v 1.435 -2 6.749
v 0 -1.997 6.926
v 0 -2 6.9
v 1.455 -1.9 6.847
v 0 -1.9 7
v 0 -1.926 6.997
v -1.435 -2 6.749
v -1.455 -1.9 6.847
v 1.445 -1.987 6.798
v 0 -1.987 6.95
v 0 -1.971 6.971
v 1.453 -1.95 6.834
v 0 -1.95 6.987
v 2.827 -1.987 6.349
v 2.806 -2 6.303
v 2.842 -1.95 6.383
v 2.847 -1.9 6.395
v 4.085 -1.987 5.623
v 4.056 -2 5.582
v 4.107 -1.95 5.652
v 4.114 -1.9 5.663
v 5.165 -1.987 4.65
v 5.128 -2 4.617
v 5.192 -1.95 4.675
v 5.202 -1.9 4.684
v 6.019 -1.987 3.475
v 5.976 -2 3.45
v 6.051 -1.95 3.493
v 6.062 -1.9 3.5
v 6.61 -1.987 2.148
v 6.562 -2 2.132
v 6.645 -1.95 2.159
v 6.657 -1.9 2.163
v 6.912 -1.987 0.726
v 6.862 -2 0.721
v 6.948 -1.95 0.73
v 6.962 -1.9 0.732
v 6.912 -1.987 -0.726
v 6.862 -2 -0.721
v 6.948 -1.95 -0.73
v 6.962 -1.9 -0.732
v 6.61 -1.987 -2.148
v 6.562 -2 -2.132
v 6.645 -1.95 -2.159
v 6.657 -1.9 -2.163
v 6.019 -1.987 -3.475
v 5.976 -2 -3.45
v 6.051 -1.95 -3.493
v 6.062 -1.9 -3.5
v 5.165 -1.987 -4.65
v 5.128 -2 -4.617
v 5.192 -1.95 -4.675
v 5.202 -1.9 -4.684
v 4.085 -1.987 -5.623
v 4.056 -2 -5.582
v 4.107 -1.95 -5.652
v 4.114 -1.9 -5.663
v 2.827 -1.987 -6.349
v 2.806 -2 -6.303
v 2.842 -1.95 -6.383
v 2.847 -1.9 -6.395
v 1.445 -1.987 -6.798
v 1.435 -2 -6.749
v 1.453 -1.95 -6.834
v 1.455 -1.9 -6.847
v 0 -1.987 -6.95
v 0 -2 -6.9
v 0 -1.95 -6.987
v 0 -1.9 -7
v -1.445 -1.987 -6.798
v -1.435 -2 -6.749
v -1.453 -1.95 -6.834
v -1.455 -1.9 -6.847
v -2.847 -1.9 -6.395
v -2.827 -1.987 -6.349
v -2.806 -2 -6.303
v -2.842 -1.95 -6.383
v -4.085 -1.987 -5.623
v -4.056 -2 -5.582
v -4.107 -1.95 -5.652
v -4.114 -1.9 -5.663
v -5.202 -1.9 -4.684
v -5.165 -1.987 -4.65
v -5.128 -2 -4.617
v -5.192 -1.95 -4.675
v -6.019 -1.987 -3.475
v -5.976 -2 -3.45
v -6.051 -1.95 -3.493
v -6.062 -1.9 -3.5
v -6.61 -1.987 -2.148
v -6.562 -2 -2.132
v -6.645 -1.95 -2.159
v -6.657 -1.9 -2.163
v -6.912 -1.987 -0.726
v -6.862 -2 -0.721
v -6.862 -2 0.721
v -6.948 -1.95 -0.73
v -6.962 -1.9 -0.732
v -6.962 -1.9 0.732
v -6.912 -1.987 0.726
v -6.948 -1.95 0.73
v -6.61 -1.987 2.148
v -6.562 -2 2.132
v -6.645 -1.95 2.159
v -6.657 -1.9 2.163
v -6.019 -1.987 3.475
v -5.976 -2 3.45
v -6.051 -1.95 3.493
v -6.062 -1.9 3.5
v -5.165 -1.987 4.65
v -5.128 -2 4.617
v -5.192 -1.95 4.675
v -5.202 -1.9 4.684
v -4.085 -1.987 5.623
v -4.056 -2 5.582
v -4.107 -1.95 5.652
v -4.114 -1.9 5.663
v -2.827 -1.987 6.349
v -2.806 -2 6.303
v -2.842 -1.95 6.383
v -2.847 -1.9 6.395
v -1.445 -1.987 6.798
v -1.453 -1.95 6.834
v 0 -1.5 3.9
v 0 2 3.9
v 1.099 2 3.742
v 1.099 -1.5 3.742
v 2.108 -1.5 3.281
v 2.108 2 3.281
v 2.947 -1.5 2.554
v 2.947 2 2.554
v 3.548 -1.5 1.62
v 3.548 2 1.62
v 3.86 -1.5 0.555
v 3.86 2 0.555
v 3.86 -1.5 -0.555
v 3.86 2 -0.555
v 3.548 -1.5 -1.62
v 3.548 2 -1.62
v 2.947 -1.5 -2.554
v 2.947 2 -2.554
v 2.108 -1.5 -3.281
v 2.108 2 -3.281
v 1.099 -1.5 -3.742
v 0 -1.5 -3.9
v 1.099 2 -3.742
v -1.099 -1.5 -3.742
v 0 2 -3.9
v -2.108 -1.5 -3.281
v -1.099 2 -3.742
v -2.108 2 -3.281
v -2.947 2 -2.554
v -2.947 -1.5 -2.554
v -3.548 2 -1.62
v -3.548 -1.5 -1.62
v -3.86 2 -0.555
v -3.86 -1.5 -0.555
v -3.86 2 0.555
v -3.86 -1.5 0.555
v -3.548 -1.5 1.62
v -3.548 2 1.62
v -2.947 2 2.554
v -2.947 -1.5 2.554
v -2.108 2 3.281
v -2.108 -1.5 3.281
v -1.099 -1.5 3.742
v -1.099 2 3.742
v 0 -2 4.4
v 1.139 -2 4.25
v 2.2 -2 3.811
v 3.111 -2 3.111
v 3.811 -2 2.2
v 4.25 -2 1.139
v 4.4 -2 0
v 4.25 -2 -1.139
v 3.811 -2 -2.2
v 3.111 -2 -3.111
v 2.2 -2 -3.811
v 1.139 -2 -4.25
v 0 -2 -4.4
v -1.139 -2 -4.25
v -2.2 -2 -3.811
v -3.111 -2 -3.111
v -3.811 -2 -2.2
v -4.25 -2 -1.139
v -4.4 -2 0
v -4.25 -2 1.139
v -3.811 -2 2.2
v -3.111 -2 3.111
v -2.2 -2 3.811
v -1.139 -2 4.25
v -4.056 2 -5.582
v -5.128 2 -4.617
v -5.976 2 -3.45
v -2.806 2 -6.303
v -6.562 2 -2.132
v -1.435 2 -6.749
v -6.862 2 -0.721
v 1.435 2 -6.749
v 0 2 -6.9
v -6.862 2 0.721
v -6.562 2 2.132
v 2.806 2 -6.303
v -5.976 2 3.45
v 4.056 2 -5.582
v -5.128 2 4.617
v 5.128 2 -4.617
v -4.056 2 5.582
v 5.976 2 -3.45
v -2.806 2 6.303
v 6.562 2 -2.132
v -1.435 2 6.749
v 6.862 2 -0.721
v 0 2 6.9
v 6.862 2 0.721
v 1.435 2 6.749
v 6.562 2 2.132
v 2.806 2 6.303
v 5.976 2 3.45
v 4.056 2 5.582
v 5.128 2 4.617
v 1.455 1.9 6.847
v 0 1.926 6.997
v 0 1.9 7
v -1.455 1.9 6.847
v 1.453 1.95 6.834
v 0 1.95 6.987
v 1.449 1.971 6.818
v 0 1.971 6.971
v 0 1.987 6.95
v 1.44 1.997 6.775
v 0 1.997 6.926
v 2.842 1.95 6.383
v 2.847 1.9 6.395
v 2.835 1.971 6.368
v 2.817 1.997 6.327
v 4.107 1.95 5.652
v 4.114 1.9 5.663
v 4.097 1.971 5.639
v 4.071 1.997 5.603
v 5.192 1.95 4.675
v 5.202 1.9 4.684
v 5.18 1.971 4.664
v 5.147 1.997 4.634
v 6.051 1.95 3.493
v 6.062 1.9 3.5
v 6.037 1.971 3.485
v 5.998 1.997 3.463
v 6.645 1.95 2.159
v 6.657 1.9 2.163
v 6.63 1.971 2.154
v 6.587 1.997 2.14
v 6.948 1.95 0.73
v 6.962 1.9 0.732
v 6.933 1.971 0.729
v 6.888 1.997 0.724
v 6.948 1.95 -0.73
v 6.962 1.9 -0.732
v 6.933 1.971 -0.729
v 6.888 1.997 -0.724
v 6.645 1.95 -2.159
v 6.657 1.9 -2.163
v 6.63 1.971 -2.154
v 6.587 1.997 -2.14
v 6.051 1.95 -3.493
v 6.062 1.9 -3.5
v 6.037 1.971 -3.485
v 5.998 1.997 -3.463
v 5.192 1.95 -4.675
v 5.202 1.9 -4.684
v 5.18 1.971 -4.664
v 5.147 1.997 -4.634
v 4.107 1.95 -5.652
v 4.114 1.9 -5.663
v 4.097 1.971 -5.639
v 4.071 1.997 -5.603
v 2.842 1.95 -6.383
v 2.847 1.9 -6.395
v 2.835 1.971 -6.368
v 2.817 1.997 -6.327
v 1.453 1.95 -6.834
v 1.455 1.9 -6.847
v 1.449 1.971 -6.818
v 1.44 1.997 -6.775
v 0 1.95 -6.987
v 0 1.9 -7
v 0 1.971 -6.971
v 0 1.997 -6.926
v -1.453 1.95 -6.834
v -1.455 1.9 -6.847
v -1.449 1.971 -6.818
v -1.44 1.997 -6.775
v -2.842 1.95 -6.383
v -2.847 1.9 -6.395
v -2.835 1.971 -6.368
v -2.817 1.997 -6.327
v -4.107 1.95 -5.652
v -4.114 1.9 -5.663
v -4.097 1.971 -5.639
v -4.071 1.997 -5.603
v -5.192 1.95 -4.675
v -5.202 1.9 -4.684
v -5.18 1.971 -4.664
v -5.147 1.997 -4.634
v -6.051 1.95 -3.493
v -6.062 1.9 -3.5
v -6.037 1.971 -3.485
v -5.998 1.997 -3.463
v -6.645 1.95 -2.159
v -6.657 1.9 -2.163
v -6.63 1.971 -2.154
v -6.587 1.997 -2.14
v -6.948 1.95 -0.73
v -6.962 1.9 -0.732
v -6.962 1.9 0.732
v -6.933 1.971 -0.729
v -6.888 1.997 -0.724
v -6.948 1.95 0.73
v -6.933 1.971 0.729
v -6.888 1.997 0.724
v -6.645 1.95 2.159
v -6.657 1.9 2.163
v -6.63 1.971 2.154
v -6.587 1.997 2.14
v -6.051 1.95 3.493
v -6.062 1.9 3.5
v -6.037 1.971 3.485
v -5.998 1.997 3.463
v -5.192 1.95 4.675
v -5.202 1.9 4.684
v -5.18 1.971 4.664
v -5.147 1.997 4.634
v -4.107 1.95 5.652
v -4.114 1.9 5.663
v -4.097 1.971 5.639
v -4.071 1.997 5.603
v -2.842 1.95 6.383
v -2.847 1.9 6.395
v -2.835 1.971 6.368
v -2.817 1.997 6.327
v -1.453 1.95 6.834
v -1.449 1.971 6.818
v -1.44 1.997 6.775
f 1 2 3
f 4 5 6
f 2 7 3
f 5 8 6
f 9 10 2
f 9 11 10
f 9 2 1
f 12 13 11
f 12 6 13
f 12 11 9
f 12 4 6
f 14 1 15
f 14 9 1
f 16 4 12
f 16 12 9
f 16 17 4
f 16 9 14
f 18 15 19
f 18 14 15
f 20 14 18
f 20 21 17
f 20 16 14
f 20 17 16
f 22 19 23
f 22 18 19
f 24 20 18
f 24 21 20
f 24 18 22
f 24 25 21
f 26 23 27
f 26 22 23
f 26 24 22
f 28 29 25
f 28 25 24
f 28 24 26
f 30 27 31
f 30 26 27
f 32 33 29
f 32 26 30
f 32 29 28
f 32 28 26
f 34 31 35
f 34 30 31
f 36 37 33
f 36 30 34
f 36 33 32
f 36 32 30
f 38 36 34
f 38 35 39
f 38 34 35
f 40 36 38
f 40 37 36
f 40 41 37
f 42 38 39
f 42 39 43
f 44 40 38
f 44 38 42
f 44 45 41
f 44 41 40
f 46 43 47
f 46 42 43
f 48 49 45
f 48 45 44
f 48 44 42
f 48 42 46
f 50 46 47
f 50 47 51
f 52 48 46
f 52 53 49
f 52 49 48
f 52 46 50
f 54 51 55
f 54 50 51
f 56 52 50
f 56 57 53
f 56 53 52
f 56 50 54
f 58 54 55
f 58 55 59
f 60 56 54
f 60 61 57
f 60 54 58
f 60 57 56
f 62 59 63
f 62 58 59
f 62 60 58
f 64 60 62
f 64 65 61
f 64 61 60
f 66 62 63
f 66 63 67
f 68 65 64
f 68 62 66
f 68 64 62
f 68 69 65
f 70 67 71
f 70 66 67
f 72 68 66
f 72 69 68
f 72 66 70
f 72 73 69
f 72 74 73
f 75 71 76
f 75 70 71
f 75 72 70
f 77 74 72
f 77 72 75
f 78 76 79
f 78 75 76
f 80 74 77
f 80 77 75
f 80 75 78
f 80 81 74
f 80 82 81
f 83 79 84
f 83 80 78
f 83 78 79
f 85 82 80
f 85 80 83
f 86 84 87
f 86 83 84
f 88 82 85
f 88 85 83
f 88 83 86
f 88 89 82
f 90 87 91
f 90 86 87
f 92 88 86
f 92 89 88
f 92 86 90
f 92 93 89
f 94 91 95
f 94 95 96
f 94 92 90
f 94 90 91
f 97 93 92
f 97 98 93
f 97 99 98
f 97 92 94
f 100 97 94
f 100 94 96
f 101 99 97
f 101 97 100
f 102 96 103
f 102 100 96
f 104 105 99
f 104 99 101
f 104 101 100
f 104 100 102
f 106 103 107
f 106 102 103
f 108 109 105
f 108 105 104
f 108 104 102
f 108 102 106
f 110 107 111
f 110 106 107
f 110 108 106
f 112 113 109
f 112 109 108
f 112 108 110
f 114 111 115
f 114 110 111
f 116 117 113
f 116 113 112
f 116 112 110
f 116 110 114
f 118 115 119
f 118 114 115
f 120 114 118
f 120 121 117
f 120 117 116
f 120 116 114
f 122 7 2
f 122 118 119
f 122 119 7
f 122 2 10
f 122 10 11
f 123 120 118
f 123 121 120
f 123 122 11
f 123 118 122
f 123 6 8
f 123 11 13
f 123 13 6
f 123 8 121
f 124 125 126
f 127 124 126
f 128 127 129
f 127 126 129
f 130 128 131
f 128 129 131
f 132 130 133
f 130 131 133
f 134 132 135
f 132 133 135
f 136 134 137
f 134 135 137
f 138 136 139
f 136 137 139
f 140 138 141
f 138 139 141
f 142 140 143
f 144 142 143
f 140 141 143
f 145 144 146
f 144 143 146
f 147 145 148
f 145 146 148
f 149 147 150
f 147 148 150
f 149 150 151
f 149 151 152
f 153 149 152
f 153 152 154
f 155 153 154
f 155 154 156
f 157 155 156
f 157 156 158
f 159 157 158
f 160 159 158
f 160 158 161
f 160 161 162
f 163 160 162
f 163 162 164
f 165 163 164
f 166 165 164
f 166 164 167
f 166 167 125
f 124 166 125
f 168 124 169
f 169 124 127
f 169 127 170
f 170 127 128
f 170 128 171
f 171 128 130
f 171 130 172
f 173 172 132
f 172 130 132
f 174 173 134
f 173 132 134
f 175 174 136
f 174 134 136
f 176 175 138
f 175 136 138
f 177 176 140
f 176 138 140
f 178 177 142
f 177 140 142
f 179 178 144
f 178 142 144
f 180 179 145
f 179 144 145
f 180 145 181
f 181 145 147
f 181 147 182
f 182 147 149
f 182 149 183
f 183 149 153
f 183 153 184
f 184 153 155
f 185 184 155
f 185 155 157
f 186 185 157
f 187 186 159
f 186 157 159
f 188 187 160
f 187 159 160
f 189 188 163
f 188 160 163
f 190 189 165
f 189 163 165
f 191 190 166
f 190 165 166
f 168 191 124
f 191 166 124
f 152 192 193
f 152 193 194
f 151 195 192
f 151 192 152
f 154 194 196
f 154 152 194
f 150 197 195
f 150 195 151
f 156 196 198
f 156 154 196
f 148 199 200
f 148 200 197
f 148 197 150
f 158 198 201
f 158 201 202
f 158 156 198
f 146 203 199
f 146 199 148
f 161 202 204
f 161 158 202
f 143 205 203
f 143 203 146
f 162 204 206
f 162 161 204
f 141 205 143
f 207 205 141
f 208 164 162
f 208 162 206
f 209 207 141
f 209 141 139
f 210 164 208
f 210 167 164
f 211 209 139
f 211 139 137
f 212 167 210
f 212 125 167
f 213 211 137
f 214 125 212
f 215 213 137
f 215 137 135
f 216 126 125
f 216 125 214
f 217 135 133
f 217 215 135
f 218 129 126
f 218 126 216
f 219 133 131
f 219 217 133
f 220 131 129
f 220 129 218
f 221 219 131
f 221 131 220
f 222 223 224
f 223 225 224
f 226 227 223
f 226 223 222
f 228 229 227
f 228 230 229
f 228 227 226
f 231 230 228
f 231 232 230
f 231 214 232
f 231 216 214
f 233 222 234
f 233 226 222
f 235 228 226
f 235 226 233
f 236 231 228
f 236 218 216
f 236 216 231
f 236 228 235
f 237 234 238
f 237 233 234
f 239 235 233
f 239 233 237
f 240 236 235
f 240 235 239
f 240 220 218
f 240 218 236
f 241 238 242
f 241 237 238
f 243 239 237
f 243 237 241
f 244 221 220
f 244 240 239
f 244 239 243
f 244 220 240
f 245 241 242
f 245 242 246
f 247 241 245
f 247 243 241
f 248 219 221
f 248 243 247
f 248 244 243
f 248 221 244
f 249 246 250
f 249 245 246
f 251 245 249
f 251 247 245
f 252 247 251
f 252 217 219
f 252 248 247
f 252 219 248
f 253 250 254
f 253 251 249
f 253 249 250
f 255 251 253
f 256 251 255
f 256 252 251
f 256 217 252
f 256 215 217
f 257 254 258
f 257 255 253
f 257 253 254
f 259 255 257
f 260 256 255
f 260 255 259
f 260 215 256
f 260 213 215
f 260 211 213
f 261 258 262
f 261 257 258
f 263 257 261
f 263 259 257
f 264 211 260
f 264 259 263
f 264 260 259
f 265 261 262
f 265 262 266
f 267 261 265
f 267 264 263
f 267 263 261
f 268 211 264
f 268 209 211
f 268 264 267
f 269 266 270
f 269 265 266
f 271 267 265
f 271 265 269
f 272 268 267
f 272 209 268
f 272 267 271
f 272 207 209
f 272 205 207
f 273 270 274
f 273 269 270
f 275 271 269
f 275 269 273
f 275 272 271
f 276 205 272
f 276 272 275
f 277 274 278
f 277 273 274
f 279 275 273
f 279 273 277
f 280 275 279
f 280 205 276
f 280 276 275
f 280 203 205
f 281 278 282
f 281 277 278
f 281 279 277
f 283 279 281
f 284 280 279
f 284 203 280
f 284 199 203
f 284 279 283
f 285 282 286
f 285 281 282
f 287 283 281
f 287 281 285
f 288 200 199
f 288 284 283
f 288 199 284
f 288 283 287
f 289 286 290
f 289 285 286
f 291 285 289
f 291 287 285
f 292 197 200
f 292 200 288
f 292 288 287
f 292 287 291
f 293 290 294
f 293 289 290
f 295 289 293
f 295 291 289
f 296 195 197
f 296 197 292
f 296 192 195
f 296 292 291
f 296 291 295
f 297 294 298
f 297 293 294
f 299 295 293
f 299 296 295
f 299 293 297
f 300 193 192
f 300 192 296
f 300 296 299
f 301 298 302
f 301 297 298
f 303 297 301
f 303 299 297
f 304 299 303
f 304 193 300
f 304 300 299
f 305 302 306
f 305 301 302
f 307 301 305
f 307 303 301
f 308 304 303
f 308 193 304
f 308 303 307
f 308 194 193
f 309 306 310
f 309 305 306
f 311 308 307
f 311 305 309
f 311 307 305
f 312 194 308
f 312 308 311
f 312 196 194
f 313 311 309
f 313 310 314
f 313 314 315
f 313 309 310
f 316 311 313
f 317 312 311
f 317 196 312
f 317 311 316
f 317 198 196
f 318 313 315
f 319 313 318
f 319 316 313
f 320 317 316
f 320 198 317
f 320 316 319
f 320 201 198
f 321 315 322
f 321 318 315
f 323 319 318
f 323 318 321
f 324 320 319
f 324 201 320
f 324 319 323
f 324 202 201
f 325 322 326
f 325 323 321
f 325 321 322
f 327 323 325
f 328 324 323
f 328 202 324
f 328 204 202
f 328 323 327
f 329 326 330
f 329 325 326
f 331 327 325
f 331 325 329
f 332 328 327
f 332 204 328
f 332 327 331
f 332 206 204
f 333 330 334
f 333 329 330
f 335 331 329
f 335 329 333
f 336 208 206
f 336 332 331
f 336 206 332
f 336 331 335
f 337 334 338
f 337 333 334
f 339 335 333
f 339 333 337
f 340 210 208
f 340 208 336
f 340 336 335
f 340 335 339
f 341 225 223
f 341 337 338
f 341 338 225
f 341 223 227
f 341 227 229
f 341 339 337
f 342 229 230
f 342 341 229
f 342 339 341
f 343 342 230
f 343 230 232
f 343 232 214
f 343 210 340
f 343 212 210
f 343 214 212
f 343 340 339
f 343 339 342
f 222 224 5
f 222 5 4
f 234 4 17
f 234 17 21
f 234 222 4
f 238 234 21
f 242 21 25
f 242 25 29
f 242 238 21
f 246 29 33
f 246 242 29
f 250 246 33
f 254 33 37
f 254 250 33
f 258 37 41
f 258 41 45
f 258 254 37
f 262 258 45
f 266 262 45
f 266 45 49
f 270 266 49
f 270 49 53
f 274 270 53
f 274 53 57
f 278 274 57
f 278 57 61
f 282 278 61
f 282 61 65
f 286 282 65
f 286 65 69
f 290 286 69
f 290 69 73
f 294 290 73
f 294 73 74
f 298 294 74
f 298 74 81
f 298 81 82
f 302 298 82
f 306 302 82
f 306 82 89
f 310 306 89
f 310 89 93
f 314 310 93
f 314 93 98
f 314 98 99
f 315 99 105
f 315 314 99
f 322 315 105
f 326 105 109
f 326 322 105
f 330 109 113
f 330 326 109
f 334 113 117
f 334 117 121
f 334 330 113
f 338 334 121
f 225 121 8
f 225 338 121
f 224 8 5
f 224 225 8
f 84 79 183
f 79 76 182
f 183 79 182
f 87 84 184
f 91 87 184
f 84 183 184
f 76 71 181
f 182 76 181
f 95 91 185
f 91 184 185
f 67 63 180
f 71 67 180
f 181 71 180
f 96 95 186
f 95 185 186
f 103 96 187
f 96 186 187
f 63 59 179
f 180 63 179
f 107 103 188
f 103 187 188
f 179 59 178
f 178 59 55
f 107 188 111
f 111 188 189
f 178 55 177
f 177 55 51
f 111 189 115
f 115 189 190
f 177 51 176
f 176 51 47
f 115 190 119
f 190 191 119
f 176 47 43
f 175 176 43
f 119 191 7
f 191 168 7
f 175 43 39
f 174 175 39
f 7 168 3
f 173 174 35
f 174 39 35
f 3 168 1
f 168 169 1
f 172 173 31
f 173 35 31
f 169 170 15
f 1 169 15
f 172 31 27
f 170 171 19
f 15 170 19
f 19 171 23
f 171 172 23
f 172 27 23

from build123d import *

# Parameters (mm, degrees)
SKETCH1_R           = 7
BOSS_EXTRUDE1_DEPTH = 2
CUT_EXTRUDE1_REACH  = 12.677
SKETCH2_R           = 3.9
CHAMFER1_SIZE       = 0.5
FILLET1_R           = 0.1


with BuildPart() as part:
    # Sketch1 → Boss-Extrude1 (new, symmetric)
    with BuildSketch(Plane(origin=(0, 0, 0), x_dir=(1, 0, 0), z_dir=(0, 1, 0))):
        with Locations(Location((0, 0, 0), (0, 0, 270))):
            Circle(SKETCH1_R)
    extrude(amount=BOSS_EXTRUDE1_DEPTH, both=True)

    # Sketch2 → Cut-Extrude1 (cut, up to next)
    with BuildSketch(Plane(origin=(0, 2, 0), x_dir=(1, 0, 0), z_dir=(0, 1, 0)), mode=Mode.PRIVATE) as cut_extrude1_sk1:
        with Locations(Location((0, 0, 0), (0, 0, 270))):
            Circle(SKETCH2_R)
    cut_extrude1_tool1 = extrude(cut_extrude1_sk1.sketch, amount=-CUT_EXTRUDE1_REACH, mode=Mode.PRIVATE) & part.part
    add(cut_extrude1_tool1.solids().sort_by_distance((0, 2, 0))[0], mode=Mode.SUBTRACT)

    # Chamfer1
    chamfer1_edges = [part.edges().sort_by_distance(p)[0] for p in [
        (0, -2, -3.9),
    ]]
    chamfer(chamfer1_edges, length=CHAMFER1_SIZE)

    # Fillet1
    fillet1_edges = [part.edges().sort_by_distance(p)[0] for p in [
        (0, -2, -7),
        (0, 2, -7),
    ]]
    fillet(fillet1_edges, radius=FILLET1_R)


solid = part.part
